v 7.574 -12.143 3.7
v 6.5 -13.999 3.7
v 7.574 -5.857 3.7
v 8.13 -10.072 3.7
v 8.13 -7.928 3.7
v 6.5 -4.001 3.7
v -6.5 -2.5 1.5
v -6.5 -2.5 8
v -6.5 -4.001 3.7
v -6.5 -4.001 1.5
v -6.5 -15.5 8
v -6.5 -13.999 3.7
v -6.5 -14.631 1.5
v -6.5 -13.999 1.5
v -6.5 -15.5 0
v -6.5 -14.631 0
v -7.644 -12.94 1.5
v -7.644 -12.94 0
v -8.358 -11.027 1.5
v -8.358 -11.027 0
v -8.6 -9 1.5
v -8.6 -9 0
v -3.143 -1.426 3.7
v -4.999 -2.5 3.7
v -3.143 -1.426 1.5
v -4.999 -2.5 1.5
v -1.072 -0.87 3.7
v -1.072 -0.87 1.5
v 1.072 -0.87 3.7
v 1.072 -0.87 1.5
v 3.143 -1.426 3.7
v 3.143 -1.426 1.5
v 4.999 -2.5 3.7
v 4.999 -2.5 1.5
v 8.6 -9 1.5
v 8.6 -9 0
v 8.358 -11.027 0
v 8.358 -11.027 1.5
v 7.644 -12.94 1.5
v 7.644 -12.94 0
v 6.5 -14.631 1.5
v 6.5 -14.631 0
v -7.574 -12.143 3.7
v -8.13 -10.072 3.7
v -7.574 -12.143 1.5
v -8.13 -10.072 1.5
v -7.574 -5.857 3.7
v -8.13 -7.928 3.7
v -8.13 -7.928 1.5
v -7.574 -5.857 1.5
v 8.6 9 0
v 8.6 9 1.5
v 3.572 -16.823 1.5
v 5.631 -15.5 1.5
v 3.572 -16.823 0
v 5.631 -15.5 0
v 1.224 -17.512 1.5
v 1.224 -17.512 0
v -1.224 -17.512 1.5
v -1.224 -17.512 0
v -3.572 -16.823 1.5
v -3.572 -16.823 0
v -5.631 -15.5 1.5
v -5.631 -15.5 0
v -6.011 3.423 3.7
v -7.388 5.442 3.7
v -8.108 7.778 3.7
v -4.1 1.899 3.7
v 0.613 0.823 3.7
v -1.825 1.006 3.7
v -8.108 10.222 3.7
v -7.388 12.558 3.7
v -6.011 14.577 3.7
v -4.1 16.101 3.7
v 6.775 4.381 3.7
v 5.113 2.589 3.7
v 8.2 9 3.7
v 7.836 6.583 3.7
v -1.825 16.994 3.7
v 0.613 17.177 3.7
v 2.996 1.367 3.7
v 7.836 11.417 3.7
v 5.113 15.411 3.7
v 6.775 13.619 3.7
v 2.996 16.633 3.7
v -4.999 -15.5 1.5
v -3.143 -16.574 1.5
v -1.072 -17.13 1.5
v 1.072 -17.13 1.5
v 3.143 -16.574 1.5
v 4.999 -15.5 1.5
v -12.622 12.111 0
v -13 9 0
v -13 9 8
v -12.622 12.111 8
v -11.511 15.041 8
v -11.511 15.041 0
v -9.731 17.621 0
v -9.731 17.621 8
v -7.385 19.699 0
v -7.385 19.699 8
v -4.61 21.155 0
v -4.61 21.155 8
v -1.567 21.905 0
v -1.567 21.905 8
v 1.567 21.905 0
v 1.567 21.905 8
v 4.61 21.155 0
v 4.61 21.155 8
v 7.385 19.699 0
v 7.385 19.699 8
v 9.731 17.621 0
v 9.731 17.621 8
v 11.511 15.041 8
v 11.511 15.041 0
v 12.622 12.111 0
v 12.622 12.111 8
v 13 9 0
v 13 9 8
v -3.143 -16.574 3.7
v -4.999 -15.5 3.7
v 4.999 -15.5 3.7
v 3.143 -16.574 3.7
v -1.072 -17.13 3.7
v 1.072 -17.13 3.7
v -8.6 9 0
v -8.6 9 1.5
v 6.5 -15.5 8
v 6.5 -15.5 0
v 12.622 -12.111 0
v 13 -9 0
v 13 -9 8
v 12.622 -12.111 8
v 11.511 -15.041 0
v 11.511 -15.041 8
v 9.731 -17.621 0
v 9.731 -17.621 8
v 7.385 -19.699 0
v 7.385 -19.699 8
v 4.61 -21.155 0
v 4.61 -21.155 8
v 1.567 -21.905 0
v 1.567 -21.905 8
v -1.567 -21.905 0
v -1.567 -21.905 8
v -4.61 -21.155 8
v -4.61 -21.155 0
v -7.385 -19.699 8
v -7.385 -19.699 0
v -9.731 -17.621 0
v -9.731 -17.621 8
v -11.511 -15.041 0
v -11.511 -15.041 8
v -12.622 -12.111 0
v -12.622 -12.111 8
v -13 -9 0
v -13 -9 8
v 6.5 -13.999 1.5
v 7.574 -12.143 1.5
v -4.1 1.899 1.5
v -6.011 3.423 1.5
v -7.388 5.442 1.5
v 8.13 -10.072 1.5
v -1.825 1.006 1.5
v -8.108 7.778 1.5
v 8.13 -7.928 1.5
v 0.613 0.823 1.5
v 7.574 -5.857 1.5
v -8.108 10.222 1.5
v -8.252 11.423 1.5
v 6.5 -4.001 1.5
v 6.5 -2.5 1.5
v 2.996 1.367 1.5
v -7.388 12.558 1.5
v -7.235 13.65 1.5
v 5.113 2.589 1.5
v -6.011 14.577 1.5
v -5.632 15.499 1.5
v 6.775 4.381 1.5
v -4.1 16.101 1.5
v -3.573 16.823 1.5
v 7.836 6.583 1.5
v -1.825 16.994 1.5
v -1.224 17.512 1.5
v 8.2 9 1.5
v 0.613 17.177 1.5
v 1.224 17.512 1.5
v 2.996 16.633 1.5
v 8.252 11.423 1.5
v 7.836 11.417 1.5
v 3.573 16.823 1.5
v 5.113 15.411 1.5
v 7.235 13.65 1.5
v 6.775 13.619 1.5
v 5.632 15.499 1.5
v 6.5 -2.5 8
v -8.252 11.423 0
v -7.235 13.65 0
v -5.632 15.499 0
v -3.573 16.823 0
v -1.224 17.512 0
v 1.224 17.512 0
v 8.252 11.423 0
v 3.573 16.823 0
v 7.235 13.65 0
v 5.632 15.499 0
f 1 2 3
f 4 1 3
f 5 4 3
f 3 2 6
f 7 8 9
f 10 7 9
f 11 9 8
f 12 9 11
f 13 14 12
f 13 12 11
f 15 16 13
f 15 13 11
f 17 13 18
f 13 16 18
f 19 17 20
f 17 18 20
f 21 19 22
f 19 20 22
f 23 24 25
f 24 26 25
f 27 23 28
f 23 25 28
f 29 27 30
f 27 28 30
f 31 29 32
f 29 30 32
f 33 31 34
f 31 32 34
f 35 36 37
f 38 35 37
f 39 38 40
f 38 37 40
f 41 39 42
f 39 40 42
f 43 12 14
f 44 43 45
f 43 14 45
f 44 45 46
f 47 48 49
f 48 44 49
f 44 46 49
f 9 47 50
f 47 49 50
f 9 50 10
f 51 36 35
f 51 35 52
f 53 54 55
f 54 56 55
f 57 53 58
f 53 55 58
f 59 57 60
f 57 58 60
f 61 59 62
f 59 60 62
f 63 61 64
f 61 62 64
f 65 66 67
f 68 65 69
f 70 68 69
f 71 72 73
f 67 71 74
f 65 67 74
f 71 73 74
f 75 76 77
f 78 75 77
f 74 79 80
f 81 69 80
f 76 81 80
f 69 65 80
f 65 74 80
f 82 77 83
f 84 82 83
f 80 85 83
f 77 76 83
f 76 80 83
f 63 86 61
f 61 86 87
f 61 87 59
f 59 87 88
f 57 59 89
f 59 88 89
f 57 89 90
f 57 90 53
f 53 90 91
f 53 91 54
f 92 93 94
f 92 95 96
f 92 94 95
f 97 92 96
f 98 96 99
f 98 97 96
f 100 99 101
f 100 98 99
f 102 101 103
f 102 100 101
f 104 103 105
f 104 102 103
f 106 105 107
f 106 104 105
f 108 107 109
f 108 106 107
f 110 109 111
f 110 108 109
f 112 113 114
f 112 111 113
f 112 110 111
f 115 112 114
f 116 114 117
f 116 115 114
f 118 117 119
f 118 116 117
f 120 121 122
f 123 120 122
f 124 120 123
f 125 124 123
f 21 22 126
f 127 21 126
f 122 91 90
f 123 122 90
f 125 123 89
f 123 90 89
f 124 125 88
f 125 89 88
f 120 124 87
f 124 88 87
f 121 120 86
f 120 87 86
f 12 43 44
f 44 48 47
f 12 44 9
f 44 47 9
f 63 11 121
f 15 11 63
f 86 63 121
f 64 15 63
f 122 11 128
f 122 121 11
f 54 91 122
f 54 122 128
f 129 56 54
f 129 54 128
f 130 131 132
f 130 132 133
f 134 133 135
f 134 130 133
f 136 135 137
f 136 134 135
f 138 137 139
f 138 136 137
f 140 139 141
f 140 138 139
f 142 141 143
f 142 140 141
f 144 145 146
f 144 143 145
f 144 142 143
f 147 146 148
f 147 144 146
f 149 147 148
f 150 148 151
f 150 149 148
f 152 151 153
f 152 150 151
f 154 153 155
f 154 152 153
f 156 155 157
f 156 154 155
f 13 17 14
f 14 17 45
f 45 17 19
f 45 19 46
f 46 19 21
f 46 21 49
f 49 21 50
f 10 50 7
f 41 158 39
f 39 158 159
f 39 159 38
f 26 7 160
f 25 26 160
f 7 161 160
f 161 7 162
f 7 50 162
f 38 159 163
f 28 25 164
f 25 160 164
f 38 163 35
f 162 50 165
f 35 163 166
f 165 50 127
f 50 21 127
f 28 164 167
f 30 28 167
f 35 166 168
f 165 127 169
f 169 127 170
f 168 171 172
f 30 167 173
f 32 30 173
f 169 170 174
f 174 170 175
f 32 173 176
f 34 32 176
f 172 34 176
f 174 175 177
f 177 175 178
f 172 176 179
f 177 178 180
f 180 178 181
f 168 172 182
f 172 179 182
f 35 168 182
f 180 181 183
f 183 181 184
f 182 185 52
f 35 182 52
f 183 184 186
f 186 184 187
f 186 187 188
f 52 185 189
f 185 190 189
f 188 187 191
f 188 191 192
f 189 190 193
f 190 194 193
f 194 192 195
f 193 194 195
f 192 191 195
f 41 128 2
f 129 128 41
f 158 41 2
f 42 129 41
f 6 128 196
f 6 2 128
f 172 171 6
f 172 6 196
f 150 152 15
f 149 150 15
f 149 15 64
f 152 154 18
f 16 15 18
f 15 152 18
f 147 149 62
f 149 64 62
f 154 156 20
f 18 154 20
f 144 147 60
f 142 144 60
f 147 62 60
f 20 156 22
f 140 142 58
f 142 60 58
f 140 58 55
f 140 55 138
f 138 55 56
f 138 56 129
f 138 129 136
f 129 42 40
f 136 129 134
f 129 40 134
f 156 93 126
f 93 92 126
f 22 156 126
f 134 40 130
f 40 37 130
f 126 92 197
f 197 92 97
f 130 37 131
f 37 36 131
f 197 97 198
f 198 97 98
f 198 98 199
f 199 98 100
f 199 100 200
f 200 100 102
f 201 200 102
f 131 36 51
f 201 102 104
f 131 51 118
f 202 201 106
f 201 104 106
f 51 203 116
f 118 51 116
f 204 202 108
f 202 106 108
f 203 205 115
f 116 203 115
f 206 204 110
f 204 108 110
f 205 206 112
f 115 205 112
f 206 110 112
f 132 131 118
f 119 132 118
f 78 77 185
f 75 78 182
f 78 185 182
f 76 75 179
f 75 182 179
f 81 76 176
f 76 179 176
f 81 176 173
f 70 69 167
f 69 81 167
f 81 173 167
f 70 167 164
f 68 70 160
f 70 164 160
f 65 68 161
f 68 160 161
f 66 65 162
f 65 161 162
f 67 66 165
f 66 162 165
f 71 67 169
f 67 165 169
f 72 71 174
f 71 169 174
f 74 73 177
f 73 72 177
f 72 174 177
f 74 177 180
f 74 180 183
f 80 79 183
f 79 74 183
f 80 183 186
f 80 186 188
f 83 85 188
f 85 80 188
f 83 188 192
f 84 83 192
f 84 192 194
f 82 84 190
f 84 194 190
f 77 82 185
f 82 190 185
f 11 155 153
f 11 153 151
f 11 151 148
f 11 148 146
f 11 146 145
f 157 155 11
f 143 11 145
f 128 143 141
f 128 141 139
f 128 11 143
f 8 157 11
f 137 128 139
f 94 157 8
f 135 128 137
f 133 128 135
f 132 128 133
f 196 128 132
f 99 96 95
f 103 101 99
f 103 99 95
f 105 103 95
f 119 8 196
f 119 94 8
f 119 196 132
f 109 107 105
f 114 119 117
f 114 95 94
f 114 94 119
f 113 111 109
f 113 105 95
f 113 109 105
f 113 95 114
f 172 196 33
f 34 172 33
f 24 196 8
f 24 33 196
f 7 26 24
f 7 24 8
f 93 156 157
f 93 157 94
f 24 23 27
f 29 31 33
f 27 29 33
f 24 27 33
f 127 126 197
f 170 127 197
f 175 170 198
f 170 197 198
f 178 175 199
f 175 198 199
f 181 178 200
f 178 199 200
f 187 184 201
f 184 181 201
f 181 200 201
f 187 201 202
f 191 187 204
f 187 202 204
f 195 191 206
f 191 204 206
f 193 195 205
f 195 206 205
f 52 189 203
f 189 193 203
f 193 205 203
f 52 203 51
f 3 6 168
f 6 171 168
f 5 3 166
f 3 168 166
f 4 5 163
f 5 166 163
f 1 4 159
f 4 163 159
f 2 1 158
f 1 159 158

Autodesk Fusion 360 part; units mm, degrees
sketch "Boceto1" plane through (0, 0, 0) normal (0, 0, 1) x (1, 0, 0)
  circle A0 centre (0, 9) radius 13
  circle A1 centre (0, -9) radius 13
  line L0 (-13, -9) -> (-13, 9)
  line L1 (13, -9) -> (13, 9)
extrude "Extruir1" add sketch "Boceto1" along normal blind 8
sketch "Boceto2" plane through (0, 0, 0) normal (0, 0, 1) x (1, 0, 0)
  circle A0 centre (0, 9) radius 8.6
  circle A1 centre (0, -9) radius 8.6
  line L0 (-8.6, -9) -> (-8.6, 9)
  line L1 (8.6, -9) -> (8.6, 9)
extrude "Extruir2" cut sketch "Boceto2" along normal blind 1.5
sketch "Boceto3" plane through (0, 0, 0) normal (0, 0, 1) x (1, 0, 0)
  circle A0 centre (0, 9) radius 8.2
  circle A1 centre (0, -9) radius 8.2
extrude "Extruir3" cut sketch "Boceto3" along normal blind 3.7
sketch "Boceto4" plane through (0, 0, 0) normal (0, 0, 1) x (1, 0, 0)
  line L0 (-6.5, -15.5) -> (6.5, -15.5)
  line L1 (6.5, -15.5) -> (6.5, -2.5)
  line L2 (6.5, -2.5) -> (-6.5, -2.5)
  line L3 (-6.5, -2.5) -> (-6.5, -15.5)
extrude "Extruir4" cut sketch "Boceto4" along normal blind 8
